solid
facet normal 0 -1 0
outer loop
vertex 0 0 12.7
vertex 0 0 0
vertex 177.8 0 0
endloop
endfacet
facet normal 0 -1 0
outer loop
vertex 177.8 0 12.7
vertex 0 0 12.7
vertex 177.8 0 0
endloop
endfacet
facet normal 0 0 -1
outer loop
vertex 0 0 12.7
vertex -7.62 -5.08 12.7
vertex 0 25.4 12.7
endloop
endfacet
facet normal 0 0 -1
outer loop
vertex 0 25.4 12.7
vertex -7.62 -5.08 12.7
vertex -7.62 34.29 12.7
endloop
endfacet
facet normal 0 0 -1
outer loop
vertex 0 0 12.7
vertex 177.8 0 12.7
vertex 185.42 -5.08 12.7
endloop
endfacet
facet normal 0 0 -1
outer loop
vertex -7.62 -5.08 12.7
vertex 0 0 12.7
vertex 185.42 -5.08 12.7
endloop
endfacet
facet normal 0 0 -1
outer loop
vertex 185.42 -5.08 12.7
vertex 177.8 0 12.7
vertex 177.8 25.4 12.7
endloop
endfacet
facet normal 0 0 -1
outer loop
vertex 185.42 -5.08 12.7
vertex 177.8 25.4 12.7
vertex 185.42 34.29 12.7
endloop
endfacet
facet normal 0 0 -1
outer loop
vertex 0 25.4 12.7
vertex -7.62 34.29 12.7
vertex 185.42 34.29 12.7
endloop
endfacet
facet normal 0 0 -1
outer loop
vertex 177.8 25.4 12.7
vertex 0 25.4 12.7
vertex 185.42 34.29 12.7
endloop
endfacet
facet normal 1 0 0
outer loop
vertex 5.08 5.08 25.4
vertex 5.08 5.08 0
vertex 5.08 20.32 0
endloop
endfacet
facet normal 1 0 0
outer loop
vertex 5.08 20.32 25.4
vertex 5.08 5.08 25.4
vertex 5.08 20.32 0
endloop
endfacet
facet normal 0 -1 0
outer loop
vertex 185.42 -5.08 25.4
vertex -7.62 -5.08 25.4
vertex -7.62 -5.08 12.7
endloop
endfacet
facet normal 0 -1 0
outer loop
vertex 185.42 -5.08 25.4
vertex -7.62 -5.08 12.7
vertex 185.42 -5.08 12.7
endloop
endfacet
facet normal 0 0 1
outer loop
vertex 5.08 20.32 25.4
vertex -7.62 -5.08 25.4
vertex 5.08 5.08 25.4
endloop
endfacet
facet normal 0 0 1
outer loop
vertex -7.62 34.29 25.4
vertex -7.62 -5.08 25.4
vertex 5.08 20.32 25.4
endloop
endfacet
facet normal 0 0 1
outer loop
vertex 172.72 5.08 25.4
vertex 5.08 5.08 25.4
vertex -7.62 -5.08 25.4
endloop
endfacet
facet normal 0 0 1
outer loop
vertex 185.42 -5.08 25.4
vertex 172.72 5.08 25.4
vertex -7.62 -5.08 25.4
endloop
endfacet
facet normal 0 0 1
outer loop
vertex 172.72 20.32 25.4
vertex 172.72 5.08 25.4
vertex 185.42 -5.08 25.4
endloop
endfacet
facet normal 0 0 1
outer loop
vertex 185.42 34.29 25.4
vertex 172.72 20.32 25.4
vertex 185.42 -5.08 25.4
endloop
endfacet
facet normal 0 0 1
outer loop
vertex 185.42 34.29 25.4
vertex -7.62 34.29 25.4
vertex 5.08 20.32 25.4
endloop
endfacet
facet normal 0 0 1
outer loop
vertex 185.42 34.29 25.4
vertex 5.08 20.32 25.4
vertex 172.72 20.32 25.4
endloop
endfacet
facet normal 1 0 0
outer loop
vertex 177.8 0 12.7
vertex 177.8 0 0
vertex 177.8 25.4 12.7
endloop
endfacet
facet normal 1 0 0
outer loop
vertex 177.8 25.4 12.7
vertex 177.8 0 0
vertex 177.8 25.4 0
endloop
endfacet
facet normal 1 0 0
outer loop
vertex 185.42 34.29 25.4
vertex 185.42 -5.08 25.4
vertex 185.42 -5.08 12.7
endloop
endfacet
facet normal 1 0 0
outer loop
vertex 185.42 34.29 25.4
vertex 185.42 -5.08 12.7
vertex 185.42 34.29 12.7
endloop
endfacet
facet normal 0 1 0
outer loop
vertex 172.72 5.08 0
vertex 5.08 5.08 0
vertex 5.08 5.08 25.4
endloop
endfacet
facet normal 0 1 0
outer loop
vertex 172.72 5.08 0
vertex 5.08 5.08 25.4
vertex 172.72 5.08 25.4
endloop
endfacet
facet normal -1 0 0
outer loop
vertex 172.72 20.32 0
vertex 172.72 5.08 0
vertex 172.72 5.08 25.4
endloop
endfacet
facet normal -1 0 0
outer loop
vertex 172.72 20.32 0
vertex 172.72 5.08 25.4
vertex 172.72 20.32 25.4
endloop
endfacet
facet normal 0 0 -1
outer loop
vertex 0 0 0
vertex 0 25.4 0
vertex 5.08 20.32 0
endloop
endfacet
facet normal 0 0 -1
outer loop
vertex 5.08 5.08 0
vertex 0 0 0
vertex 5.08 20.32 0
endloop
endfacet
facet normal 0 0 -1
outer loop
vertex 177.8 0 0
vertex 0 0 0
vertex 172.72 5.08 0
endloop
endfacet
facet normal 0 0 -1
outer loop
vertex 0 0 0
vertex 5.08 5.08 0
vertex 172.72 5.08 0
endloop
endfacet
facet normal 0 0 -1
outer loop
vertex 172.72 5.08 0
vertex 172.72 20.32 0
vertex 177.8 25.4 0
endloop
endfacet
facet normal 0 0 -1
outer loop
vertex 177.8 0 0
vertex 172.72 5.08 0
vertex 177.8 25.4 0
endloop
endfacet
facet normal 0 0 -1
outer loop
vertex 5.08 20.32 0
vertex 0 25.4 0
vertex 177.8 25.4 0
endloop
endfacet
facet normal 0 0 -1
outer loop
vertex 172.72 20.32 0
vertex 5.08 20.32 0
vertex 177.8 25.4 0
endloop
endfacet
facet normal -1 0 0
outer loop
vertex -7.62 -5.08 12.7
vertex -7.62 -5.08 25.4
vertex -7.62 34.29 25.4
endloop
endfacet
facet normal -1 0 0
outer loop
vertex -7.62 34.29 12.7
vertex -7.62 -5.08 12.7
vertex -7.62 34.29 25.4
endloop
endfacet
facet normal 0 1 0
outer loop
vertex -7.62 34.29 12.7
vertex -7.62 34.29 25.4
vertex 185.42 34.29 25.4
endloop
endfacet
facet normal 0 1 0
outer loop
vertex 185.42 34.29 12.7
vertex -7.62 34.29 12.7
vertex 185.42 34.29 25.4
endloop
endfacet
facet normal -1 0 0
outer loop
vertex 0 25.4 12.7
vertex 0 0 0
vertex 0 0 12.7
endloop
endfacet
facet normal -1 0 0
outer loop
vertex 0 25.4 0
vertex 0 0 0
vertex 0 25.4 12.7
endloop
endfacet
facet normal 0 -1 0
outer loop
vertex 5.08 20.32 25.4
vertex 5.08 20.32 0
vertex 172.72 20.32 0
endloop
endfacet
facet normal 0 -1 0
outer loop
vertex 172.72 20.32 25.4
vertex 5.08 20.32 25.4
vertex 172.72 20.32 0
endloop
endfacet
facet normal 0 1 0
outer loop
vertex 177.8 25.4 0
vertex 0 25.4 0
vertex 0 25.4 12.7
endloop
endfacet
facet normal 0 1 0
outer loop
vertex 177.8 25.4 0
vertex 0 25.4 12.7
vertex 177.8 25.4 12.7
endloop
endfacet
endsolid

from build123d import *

# Parameters (mm, degrees)
SKETCH1_W           = 177.8
SKETCH1_H           = 25.4
SKETCH1_W_2         = 167.64
SKETCH1_H_2         = 15.24
BOSS_EXTRUDE2_DEPTH = 25.4
SKETCH3_W           = 193.04
SKETCH3_H           = 39.37
SKETCH3_W_2         = 177.8
SKETCH3_H_2         = 25.4
BOSS_EXTRUDE3_DEPTH = 12.7


with BuildPart() as part:
    # Sketch1 → Boss-Extrude2 (new body)
    with BuildSketch(Plane.XY):
        with Locations((88.9, 12.7)):
            Rectangle(SKETCH1_W, SKETCH1_H)
        with Locations((88.9, 12.7)):
            Rectangle(SKETCH1_W_2, SKETCH1_H_2, mode=Mode.SUBTRACT)
    extrude(amount=BOSS_EXTRUDE2_DEPTH)

    # Sketch3 → Boss-Extrude3 (add)
    with BuildSketch(Plane.XY.offset(25.4)):
        with Locations((88.9, 14.605)):
            Rectangle(SKETCH3_W, SKETCH3_H)
        with Locations((88.9, 12.7)):
            Rectangle(SKETCH3_W_2, SKETCH3_H_2, mode=Mode.SUBTRACT)
    extrude(amount=-BOSS_EXTRUDE3_DEPTH)


solid = part.part
